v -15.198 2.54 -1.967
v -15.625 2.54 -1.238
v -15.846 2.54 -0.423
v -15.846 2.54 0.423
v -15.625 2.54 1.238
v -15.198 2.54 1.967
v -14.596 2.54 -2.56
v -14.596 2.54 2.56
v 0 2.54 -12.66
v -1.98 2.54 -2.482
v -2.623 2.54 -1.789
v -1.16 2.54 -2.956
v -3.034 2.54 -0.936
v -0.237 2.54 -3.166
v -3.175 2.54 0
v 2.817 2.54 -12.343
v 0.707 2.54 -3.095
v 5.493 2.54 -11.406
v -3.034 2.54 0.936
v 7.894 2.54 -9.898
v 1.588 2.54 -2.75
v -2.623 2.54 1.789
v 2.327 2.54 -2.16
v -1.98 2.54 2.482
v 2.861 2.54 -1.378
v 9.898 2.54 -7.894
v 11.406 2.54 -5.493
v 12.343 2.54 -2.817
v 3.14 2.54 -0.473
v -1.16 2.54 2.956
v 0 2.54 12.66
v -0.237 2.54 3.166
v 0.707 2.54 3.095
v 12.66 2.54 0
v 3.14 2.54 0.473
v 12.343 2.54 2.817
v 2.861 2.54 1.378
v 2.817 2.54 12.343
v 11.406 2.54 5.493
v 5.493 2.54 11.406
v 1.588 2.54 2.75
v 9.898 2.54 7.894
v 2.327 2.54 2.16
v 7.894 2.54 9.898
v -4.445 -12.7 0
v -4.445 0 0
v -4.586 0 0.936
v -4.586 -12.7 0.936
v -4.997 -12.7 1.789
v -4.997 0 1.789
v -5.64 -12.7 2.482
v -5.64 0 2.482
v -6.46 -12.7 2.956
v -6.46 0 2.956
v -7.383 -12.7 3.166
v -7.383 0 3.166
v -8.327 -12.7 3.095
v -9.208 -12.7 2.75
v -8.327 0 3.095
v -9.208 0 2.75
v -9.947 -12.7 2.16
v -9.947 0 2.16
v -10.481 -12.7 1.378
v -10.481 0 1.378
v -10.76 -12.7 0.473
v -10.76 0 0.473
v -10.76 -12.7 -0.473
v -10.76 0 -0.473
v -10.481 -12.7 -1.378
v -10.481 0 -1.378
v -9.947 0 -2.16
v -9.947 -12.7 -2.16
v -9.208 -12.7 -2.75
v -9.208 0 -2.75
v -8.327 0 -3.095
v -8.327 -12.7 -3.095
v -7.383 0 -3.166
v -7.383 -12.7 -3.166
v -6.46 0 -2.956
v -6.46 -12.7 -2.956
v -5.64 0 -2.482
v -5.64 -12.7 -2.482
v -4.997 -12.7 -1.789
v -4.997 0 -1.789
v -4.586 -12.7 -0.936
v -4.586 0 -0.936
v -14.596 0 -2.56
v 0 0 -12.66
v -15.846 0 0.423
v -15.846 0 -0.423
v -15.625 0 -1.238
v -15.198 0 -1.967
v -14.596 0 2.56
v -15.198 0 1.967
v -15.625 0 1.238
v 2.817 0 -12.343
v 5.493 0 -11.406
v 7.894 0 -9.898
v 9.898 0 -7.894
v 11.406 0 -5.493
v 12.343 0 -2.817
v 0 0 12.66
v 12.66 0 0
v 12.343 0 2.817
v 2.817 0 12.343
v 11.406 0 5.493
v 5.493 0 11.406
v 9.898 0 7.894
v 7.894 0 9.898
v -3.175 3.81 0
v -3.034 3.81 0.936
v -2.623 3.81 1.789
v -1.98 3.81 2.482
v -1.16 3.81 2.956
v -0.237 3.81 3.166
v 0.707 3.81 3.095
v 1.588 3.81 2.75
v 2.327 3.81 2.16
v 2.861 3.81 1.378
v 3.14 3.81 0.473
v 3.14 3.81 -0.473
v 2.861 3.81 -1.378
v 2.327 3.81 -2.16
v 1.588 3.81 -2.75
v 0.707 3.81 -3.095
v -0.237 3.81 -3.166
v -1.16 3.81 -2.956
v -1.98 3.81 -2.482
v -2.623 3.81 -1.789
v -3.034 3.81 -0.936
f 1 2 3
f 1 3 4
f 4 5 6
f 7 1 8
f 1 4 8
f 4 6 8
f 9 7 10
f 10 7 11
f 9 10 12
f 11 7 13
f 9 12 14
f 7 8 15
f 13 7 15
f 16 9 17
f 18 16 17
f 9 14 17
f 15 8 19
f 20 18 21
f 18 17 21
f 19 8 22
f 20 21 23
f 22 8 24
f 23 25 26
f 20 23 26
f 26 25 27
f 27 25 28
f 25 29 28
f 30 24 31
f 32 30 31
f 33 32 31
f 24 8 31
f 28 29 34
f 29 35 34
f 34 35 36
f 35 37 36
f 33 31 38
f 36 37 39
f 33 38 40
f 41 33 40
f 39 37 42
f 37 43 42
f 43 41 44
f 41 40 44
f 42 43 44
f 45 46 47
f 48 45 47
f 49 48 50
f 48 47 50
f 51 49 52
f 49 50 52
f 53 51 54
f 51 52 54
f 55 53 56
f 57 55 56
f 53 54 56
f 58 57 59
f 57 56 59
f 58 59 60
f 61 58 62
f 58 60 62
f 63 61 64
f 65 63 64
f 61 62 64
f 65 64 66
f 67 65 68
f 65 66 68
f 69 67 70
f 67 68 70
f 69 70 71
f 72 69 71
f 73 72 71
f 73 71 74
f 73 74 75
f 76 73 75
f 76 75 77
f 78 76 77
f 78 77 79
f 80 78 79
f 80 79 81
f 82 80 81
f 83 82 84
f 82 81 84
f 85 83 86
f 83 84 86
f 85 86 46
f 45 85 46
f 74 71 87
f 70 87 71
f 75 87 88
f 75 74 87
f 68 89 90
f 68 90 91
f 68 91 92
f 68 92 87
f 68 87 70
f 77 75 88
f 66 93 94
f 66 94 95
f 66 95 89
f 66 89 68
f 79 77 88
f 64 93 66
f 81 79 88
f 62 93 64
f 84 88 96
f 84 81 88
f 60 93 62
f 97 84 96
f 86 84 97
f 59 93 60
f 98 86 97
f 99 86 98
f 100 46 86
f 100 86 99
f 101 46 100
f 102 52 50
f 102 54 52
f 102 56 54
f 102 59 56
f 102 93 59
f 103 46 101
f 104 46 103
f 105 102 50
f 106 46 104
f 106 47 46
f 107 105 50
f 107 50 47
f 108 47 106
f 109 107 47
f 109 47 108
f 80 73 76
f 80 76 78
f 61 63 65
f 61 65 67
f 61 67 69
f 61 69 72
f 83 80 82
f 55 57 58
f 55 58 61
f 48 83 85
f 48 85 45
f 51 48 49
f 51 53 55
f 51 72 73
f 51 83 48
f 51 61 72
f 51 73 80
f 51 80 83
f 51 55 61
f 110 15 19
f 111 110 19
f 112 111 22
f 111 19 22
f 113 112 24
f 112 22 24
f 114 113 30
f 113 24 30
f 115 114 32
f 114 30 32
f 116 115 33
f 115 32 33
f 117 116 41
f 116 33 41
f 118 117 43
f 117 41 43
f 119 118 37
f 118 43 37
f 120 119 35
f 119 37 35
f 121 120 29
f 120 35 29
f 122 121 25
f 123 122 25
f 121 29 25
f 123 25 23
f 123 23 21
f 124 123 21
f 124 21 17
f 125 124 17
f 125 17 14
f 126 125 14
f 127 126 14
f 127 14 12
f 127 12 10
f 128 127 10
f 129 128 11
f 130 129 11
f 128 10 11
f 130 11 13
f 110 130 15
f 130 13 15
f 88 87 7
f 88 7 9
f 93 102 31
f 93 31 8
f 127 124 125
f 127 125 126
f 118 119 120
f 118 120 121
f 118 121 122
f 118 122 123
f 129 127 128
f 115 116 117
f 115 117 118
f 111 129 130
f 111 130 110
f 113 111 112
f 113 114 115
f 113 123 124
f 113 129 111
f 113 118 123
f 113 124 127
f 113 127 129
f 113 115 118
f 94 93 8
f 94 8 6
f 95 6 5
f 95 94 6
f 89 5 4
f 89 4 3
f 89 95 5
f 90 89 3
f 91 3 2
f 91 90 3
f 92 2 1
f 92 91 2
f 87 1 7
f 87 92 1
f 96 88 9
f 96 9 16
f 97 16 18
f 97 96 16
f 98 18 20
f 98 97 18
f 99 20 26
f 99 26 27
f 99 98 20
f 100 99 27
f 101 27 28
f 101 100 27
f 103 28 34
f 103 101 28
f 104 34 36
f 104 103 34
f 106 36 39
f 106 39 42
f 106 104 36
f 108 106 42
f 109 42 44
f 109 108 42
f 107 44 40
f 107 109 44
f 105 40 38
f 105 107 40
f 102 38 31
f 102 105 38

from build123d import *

# Parameters (mm, degrees)
F1_R     = 3.175
F2_DEPTH = 12.7
F4_DEPTH = 2.54
F5_R     = 3.175
F6_DEPTH = 1.27


with BuildPart() as f2:
    # F1 (on Front) → F2 (new body)
    with BuildSketch(Plane.XZ):
        with Locations((-7.62, 0)):
            Circle(F1_R)
    extrude(amount=F2_DEPTH)

    # F3 (on Front) → F4 (join)
    with BuildSketch(Plane.XZ):
        with BuildLine():
            Line((-14.5955, -2.559695), (0, -12.660234))
            ThreePointArc((0, -12.660234), (12.660234, 0), (0, 12.660234))
            Line((0, 12.660234), (-14.5955, 2.559695))
            ThreePointArc((-14.5955, 2.559695), (-15.87429, 0), (-14.5955, -2.559695))
        make_face()
    extrude(amount=-F4_DEPTH)

    # F5 (on face) → F6 (join)
    with BuildSketch(Plane(origin=(0, 2.54, 0), x_dir=(-1, 0, 0), z_dir=(0, 1, 0))):
        Circle(F5_R)
    extrude(amount=F6_DEPTH)


solid = f2.part
